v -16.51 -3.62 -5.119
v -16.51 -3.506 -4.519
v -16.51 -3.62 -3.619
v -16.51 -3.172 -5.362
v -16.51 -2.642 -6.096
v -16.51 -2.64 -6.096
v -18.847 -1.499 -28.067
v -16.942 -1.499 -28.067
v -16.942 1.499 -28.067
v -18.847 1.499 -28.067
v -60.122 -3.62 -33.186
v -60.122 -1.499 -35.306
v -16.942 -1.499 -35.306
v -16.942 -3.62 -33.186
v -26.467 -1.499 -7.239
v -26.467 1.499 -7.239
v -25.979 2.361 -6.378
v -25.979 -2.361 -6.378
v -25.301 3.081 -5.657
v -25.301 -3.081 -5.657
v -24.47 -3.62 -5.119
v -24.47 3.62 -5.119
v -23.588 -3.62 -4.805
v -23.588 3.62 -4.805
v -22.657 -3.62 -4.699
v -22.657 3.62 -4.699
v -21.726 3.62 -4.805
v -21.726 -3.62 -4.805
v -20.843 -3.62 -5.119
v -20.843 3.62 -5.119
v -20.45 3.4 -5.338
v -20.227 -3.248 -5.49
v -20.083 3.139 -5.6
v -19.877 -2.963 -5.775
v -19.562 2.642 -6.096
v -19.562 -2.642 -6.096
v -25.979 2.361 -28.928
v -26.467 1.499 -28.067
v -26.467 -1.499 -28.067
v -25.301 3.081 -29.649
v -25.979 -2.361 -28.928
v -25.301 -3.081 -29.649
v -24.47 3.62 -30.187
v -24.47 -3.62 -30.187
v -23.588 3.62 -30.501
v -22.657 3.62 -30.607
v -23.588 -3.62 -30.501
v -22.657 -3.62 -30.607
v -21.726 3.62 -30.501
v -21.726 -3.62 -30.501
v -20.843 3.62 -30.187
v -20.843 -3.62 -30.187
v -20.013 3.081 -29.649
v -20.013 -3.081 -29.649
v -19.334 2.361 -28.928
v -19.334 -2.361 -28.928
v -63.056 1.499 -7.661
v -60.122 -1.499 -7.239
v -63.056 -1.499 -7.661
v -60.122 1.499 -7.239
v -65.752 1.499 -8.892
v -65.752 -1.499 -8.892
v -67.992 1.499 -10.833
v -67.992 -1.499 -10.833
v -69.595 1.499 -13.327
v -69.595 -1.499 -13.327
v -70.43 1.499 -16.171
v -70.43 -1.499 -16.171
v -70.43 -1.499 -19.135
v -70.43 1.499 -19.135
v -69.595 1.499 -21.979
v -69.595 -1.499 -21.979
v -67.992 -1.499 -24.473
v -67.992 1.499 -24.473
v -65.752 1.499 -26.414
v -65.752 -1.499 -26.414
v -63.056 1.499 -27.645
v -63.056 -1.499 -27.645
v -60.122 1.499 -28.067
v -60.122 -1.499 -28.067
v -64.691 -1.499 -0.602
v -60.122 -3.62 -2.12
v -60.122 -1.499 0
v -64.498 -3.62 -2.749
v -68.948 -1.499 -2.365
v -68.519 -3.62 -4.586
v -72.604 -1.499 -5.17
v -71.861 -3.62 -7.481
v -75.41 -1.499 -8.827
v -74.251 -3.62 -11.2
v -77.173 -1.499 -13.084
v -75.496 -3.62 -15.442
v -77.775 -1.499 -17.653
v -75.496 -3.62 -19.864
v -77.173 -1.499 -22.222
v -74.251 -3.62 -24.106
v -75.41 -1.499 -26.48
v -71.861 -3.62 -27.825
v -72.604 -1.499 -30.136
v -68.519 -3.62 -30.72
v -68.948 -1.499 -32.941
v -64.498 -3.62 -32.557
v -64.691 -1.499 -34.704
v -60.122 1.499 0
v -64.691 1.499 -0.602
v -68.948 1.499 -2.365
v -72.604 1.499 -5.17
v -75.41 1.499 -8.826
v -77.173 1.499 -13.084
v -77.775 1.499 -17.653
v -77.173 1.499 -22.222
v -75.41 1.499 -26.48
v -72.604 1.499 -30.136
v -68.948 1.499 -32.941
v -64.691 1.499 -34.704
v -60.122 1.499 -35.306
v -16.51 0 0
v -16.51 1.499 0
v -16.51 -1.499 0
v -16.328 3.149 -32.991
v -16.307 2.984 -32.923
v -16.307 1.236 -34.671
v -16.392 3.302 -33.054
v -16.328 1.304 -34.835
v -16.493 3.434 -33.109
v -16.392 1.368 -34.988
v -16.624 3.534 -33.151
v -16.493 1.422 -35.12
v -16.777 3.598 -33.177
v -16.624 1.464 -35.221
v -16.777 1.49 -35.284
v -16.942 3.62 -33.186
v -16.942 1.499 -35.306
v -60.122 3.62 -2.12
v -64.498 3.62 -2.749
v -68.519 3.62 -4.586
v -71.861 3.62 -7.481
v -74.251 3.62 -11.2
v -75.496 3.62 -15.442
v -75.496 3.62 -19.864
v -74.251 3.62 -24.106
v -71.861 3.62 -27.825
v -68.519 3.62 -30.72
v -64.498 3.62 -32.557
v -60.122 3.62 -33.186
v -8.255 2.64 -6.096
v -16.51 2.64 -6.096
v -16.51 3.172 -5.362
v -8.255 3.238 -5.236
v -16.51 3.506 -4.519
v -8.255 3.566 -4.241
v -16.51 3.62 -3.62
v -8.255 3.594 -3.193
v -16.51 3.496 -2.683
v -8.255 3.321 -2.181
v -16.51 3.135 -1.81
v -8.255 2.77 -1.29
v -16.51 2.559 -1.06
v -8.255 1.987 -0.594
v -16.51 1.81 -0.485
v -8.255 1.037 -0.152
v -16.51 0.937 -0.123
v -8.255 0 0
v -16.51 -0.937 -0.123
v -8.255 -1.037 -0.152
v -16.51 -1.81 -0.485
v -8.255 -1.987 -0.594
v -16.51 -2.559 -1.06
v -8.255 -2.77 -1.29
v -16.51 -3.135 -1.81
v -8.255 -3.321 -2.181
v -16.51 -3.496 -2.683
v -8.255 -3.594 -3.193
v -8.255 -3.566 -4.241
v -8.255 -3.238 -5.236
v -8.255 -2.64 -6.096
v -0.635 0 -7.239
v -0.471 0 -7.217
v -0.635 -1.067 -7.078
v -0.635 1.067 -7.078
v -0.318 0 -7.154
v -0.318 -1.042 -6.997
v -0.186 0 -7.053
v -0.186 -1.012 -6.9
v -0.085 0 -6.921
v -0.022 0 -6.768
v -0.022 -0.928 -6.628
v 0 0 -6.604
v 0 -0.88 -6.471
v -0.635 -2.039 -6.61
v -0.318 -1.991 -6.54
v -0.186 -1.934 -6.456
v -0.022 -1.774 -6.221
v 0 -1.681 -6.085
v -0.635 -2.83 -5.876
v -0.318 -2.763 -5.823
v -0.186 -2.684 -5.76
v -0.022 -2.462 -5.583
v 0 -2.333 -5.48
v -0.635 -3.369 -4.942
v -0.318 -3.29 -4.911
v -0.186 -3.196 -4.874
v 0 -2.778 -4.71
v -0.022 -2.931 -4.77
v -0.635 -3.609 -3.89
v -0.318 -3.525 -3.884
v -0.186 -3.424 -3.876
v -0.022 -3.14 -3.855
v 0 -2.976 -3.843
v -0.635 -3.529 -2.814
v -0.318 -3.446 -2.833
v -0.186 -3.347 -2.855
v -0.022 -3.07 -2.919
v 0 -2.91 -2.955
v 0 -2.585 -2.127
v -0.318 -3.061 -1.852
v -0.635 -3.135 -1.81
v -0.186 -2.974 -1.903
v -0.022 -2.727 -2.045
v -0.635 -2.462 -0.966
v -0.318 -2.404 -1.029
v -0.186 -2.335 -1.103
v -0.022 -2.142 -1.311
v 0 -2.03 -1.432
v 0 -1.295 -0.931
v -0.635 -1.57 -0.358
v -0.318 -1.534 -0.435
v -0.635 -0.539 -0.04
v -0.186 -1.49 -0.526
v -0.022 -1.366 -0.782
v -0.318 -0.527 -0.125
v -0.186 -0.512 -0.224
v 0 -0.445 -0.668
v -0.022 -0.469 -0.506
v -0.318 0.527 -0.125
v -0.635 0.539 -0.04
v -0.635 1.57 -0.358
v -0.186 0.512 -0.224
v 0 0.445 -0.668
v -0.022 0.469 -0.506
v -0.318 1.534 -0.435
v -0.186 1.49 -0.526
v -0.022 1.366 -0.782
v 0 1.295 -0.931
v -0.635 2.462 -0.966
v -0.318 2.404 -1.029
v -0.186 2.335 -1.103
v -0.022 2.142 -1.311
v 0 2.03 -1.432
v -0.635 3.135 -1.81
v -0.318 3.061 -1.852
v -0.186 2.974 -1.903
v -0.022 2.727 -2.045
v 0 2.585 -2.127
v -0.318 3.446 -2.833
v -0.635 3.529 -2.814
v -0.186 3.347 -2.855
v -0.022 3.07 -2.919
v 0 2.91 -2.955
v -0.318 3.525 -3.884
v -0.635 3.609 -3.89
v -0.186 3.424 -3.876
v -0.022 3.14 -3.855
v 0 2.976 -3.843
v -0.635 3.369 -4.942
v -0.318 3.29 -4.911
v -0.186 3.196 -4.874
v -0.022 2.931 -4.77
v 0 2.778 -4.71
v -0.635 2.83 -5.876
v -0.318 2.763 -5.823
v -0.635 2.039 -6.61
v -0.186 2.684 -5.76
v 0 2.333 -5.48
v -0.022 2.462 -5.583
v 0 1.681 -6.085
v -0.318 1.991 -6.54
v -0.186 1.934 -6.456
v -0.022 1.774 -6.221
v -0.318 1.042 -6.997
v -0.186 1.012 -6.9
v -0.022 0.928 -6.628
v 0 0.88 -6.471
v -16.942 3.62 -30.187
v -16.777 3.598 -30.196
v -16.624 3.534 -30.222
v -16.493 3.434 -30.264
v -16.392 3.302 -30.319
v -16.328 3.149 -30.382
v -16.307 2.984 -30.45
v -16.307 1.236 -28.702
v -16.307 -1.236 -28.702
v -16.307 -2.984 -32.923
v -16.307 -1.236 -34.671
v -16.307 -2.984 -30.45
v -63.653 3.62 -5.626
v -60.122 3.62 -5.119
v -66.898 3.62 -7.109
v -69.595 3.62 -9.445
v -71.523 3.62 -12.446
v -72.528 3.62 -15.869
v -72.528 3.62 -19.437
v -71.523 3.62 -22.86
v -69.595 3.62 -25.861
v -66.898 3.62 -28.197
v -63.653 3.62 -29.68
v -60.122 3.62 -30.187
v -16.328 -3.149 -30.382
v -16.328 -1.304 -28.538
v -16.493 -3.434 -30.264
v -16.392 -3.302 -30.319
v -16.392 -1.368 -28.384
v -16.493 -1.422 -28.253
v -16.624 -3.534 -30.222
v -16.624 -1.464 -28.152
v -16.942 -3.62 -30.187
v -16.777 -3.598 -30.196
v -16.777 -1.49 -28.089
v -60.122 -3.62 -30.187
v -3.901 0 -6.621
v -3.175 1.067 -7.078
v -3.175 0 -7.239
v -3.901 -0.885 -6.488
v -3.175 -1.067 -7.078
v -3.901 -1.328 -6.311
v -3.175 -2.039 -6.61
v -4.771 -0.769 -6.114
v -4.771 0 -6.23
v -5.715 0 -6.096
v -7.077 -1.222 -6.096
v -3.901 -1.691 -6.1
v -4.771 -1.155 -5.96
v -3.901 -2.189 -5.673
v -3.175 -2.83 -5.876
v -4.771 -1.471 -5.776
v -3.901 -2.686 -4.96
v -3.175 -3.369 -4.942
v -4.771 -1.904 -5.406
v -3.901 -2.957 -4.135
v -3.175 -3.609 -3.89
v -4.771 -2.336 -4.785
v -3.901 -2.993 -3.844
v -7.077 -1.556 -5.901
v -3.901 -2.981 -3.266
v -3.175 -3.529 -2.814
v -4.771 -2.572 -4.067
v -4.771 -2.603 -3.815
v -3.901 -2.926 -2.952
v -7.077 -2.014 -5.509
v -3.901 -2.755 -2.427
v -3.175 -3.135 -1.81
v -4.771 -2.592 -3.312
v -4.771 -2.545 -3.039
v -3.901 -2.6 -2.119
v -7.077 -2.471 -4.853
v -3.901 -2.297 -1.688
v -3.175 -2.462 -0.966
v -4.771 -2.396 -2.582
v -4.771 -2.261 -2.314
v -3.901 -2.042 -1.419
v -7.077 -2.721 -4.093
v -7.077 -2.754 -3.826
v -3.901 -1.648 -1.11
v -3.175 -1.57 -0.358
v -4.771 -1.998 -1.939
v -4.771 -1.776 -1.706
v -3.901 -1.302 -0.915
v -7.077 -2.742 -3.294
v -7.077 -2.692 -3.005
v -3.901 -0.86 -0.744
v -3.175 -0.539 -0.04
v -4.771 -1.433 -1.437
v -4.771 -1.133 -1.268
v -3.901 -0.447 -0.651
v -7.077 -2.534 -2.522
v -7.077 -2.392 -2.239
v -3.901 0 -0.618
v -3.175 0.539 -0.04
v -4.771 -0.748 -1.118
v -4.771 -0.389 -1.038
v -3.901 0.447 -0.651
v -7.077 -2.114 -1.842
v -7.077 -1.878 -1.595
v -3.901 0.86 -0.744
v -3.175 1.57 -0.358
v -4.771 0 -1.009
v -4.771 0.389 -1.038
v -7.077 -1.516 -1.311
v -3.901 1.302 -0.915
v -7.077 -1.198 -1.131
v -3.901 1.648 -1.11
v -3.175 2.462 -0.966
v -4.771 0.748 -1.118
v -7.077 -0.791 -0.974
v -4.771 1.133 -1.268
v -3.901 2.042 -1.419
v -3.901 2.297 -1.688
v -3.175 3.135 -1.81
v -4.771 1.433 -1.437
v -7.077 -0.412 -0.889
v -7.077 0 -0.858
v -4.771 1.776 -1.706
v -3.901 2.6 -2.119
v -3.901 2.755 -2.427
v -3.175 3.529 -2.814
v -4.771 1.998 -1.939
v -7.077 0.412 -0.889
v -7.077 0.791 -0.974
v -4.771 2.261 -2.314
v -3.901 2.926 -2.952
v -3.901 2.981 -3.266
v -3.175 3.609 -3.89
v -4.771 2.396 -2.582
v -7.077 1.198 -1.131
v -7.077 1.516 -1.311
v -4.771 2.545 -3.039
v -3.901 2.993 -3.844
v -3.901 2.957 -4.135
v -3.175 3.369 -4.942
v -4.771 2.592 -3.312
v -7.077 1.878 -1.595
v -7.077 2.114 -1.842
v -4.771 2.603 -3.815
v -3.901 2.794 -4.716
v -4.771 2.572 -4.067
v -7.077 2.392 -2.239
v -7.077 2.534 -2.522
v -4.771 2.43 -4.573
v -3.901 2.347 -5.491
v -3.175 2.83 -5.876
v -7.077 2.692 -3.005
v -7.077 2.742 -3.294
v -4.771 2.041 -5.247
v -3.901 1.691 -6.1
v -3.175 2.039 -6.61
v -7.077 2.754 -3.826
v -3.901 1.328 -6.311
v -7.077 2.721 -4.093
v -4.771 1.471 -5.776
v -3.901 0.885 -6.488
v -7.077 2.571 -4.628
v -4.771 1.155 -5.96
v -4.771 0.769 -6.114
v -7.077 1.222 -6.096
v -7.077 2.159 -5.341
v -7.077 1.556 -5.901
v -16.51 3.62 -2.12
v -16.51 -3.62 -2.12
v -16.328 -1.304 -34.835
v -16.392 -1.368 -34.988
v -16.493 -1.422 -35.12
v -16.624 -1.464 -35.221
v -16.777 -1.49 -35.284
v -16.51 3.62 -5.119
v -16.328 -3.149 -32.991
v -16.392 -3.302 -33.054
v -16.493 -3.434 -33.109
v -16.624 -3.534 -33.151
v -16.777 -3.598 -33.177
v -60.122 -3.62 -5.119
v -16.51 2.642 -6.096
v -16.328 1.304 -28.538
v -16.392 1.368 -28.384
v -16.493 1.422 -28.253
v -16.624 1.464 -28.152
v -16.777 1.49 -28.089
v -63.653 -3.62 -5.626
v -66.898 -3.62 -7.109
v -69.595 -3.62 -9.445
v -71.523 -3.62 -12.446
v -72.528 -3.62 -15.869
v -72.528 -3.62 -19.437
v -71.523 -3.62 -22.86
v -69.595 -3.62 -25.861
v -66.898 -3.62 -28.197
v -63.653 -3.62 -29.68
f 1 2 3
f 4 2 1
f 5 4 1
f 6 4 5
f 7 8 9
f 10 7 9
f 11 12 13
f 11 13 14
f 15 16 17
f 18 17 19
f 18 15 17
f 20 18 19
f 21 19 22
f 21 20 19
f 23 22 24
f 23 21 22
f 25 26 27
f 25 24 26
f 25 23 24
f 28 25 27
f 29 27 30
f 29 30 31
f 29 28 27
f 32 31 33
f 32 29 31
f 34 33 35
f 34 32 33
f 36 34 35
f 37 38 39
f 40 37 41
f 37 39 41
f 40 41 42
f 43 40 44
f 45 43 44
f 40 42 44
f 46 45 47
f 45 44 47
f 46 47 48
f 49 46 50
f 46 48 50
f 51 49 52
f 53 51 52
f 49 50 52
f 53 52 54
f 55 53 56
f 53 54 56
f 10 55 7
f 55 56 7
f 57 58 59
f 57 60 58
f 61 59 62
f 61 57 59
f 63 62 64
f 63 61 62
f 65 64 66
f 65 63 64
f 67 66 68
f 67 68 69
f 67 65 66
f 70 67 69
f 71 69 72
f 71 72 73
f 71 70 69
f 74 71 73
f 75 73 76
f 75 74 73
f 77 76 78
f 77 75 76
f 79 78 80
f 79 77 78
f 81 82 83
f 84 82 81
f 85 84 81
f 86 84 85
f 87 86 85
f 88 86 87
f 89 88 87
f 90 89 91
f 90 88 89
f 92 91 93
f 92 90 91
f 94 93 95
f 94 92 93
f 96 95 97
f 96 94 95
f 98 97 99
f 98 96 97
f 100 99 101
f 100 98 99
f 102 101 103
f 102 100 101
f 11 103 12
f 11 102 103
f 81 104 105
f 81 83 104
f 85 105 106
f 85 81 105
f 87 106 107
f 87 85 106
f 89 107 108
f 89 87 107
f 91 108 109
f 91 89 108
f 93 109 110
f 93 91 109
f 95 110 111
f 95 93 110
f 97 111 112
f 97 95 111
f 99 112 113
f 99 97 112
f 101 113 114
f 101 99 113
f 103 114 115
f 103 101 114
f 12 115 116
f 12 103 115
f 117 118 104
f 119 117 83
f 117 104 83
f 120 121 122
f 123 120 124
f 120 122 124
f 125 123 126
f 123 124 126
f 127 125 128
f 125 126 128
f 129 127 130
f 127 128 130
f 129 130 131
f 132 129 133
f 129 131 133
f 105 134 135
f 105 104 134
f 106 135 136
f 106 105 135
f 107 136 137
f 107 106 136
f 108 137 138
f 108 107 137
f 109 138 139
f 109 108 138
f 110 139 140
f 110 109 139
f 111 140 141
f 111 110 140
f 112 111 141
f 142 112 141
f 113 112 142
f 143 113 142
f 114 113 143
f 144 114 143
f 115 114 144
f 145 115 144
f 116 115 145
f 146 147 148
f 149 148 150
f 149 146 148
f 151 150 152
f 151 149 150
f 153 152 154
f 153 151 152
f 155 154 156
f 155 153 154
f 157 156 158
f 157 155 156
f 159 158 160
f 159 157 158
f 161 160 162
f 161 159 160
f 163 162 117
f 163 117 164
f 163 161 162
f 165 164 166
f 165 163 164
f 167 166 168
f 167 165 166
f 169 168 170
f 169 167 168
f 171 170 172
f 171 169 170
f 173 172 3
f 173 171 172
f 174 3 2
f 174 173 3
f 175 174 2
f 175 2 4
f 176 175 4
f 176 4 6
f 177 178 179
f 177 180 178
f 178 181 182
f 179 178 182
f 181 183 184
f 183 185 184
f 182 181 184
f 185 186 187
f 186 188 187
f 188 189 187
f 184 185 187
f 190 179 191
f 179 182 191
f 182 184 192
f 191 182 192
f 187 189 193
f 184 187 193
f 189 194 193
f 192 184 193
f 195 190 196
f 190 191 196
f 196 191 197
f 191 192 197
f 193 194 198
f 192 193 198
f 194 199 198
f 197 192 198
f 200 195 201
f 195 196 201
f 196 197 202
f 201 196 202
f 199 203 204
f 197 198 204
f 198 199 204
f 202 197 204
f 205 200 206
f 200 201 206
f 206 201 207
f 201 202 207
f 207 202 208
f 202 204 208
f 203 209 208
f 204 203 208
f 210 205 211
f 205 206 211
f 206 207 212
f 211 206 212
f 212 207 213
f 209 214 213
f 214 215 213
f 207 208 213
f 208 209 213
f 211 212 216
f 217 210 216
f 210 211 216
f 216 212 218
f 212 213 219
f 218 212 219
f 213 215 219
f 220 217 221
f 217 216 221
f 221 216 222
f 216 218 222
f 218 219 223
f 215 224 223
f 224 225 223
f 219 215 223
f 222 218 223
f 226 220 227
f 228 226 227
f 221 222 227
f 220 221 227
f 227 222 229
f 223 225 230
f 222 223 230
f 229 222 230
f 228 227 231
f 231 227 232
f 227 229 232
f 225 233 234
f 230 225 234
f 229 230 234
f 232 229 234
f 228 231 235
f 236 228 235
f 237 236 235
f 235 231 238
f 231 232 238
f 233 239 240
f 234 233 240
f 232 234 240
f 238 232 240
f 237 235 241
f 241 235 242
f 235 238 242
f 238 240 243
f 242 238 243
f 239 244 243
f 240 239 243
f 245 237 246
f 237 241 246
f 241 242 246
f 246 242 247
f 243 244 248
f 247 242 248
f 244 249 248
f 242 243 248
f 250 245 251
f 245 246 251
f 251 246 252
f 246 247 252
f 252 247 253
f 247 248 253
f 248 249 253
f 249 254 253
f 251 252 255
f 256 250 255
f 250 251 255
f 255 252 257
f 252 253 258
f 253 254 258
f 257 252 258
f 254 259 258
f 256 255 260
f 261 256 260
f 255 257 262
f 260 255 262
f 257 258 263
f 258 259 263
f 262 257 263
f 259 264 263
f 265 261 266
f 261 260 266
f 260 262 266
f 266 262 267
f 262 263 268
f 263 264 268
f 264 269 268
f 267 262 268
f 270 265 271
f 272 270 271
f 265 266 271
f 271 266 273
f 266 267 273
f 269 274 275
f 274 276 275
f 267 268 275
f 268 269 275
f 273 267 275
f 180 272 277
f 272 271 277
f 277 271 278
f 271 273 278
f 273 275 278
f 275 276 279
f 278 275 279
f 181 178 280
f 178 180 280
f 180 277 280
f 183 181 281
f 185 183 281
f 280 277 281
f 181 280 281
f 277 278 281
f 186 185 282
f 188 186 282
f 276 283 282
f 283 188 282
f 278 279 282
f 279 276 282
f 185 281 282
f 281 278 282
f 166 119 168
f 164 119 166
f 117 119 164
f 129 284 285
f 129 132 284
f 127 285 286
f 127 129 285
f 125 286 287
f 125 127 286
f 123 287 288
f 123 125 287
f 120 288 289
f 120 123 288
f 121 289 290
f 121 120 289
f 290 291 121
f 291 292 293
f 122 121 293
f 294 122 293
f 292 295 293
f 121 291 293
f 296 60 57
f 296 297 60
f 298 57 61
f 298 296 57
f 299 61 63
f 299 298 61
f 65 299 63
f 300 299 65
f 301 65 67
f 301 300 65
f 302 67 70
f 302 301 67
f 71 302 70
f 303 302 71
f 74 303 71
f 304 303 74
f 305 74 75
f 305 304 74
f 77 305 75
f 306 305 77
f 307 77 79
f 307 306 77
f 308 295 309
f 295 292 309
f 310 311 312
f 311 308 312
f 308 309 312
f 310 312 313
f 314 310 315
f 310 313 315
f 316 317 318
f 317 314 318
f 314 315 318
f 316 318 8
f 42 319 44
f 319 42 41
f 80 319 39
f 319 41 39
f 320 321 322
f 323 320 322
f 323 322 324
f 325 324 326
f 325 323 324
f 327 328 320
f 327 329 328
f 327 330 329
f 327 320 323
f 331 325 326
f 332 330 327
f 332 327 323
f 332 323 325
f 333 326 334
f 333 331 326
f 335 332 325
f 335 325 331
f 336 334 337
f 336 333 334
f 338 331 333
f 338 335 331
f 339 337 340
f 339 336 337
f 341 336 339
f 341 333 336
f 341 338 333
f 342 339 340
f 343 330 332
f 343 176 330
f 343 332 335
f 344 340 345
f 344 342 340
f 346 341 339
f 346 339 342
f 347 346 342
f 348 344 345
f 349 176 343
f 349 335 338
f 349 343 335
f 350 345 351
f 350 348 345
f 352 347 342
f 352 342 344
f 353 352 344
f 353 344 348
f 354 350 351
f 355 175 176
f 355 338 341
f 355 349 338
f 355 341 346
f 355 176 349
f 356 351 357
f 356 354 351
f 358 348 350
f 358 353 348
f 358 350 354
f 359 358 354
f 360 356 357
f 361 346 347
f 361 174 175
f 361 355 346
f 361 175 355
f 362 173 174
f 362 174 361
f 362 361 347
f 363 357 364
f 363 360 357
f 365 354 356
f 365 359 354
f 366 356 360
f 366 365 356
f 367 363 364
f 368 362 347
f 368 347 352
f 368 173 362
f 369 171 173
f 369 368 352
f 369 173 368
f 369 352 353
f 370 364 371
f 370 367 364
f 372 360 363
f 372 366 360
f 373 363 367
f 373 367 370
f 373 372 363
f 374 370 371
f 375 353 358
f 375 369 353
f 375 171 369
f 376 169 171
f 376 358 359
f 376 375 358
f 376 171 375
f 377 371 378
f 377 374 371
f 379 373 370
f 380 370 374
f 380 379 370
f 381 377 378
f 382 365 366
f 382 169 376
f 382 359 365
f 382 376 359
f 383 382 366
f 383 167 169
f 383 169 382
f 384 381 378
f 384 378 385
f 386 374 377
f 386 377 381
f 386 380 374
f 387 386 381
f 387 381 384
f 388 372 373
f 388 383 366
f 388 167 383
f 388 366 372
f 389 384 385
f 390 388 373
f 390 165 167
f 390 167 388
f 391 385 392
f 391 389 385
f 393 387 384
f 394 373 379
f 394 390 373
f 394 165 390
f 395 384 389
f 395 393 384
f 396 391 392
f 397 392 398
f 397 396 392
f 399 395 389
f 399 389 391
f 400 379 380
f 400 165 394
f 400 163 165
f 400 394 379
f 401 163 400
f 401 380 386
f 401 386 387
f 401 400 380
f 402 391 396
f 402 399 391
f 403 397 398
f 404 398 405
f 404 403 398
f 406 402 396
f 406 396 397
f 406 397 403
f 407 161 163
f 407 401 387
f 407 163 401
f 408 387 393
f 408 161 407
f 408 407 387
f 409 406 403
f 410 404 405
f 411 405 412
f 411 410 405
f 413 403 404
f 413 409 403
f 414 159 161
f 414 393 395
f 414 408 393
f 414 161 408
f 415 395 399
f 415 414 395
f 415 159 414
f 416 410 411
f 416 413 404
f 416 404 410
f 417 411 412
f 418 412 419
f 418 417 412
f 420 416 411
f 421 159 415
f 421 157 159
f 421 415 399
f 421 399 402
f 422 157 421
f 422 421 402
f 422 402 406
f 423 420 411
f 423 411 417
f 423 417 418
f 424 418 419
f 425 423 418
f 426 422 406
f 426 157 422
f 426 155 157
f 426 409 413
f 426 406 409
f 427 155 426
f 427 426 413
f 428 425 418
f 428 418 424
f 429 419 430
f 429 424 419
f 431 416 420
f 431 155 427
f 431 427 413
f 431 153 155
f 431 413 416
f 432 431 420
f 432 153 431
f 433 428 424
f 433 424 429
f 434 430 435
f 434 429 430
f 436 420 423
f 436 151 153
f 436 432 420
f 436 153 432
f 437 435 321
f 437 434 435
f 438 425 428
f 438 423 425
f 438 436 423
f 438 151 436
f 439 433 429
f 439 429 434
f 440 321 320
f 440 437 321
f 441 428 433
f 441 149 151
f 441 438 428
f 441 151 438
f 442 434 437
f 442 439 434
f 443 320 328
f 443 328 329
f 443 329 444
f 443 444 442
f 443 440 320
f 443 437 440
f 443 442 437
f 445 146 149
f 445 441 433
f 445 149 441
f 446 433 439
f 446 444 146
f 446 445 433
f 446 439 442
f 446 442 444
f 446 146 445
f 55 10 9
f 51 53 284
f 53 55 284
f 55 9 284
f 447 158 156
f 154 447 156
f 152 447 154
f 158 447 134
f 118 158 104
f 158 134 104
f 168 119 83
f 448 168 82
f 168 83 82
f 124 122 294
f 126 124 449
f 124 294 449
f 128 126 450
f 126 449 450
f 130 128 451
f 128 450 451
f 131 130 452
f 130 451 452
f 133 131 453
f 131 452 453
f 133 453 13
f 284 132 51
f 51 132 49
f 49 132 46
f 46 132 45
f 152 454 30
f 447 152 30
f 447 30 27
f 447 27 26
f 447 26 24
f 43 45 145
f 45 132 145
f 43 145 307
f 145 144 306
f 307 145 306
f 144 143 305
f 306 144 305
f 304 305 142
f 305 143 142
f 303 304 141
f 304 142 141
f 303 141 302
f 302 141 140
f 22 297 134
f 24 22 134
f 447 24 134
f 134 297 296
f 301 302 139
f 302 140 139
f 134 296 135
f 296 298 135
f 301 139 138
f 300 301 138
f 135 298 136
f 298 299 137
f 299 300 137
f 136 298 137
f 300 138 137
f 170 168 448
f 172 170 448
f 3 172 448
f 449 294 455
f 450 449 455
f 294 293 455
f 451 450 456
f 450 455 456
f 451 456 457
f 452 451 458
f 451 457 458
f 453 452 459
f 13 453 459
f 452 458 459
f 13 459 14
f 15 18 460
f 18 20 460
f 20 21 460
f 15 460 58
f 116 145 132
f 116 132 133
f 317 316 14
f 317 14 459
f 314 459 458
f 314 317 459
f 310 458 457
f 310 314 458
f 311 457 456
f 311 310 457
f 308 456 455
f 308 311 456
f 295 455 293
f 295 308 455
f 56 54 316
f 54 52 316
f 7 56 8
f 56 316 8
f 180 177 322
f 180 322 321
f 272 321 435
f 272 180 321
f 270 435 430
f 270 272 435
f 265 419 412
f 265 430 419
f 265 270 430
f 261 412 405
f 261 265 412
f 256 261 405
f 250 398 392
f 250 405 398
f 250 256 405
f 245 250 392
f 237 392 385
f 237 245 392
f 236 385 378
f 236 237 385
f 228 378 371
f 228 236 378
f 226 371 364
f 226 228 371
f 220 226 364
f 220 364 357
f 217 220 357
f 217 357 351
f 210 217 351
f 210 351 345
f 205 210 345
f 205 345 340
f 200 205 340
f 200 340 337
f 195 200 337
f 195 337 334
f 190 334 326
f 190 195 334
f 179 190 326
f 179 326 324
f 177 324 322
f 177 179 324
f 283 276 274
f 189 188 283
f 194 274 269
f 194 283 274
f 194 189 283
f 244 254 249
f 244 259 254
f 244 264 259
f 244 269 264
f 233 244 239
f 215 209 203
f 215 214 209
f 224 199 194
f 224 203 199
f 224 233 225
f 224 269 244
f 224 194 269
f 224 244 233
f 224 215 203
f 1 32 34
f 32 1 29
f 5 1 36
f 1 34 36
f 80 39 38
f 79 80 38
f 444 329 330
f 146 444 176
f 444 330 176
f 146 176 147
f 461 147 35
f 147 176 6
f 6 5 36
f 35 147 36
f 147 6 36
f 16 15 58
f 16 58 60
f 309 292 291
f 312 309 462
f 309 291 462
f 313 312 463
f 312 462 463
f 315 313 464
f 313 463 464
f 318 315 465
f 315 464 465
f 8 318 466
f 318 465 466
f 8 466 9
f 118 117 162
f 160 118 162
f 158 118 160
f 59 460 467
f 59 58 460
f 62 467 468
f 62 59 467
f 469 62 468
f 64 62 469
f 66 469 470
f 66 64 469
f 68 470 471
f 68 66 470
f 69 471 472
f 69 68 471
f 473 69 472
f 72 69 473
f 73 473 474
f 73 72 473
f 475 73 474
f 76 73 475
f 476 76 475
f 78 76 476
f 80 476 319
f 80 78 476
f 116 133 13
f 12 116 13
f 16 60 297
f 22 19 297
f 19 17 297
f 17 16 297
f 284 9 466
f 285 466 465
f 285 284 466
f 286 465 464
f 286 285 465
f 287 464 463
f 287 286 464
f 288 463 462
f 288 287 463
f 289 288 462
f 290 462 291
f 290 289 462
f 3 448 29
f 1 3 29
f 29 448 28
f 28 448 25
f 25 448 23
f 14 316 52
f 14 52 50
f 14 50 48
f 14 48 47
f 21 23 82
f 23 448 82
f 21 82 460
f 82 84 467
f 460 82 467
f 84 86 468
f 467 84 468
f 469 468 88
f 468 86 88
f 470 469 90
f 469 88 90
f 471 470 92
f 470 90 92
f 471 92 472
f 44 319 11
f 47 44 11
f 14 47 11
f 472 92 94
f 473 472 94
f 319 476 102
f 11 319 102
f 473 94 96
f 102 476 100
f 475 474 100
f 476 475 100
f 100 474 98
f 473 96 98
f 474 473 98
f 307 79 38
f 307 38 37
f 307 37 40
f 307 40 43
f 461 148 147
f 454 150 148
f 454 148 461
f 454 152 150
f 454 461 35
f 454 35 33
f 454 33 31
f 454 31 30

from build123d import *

# Parameters (mm, degrees)
SKETCH3_R               = 3.917718569
SKETCH3_R_2             = 3.6195
CUT_EXTRUDE1_DEPTH      = 16.51
CUT_EXTRUDE2_DEPTH      = 86.489963921
CUT_EXTRUDE2_DEPTH_BACK = 86.489963921
CUT_EXTRUDE3_DEPTH      = 86.489963921
CUT_EXTRUDE3_DEPTH_BACK = 86.489963921
FILLET1_R               = 0.635


with BuildPart() as part:
    # Sweep1: sweep along a path in Sketch1
    with BuildLine(Plane(origin=(0, 0, 0), x_dir=(1, 0, 0), z_dir=(0, 1, 0))) as sweep1_path:
        Line((0, 0), (-60.1218, 0))
        ThreePointArc((-60.1218, 0), (-77.7748, 17.653), (-60.1218, 35.306))
        Line((-60.1218, 35.306), (-16.3068, 35.306))
    # Sketch2 → Sweep1 (sweep)
    with BuildSketch(Plane(origin=(0, 0, 0), x_dir=(0, 0, -1), z_dir=(1, 0, 0))):
        Polygon((7.239, 1.499245989), (5.118745989, 3.6195), (2.120254011, 3.6195), (0, 1.499245989), (0, -1.499245989), (2.120254011, -3.6195), (5.118745989, -3.6195), (7.239, -1.499245989), align=None)
    sweep(path=sweep1_path.line)

    # Sketch3 → Cut-Extrude1 (cut)
    with BuildSketch(Plane(origin=(0, 0, 0), x_dir=(0, 0, -1), z_dir=(1, 0, 0))):
        with Locations((3.6195, 0)):
            Circle(SKETCH3_R)
        with Locations((3.6195, 0)):
            Circle(SKETCH3_R_2, mode=Mode.SUBTRACT)
    extrude(amount=-CUT_EXTRUDE1_DEPTH, mode=Mode.SUBTRACT)

    # Sketch5 → Cut-Revolve1 (revolve, cut)
    with BuildSketch(Plane(origin=(0, 0, 0), x_dir=(1, 0, 0), z_dir=(0, 1, 0))):
        with BuildLine():
            Line((-8.255, 7.239), (-3.175, 7.239))
            ThreePointArc((-3.175, 7.239), (-5.715, 6.096), (-8.255, 7.239))
        make_face()
    revolve(axis=Axis((0, 0, -3.6195), (-1, 0, 0)), mode=Mode.SUBTRACT)

    # Sketch6 → Cut-Extrude2 (cut, two sides: drawn at the far end of the back side and taken through both)
    with BuildSketch(Plane(origin=(0, 0, 0), x_dir=(1, 0, 0), z_dir=(0, 1, 0)).offset(-CUT_EXTRUDE2_DEPTH_BACK)):
        with BuildLine():
            Line((-18.8468, 28.067), (-26.4668, 28.067))
            ThreePointArc((-26.4668, 28.067), (-22.6568, 30.607), (-18.8468, 28.067))
        make_face()
        with BuildLine():
            Line((-18.8468, 7.239), (-26.4668, 7.239))
            ThreePointArc((-26.4668, 7.239), (-22.6568, 4.699), (-18.8468, 7.239))
        make_face()
    extrude(amount=CUT_EXTRUDE2_DEPTH + CUT_EXTRUDE2_DEPTH_BACK, mode=Mode.SUBTRACT)

    # Sketch7 → Cut-Extrude3 (cut, two sides: drawn at the far end of the back side and taken through both)
    with BuildSketch(Plane(origin=(0, 0, 0), x_dir=(1, 0, 0), z_dir=(0, 1, 0)).offset(-CUT_EXTRUDE3_DEPTH_BACK)):
        with BuildLine():
            Line((-5.715, 6.096), (-19.561541368, 6.096))
            ThreePointArc((-19.561541368, 6.096), (-19.157191244, 6.638122792), (-18.8468, 7.239))
            Line((-18.8468, 7.239), (-8.255, 7.239))
            ThreePointArc((-8.255, 7.239), (-7.107663725, 6.394913945), (-5.715, 6.096))
        make_face()
    extrude(amount=CUT_EXTRUDE3_DEPTH + CUT_EXTRUDE3_DEPTH_BACK, mode=Mode.SUBTRACT)

    # Fillet1
    fillet1_edges = [part.edges().sort_by_distance(p)[0] for p in [
        (-16.3068, 0, -28.067),
        (-16.3068, 2.559372995, -29.127127005),
        (-16.3068, 3.6195, -31.6865),
        (-16.3068, 2.559372995, -34.245872995),
        (-16.3068, 0, -35.306),
        (-16.3068, -2.559372995, -34.245872995),
        (-16.3068, -3.6195, -31.6865),
        (-16.3068, -2.559372995, -29.127127005),
        (0, 0, 0),
    ]]
    fillet(fillet1_edges, radius=FILLET1_R)


solid = part.part
